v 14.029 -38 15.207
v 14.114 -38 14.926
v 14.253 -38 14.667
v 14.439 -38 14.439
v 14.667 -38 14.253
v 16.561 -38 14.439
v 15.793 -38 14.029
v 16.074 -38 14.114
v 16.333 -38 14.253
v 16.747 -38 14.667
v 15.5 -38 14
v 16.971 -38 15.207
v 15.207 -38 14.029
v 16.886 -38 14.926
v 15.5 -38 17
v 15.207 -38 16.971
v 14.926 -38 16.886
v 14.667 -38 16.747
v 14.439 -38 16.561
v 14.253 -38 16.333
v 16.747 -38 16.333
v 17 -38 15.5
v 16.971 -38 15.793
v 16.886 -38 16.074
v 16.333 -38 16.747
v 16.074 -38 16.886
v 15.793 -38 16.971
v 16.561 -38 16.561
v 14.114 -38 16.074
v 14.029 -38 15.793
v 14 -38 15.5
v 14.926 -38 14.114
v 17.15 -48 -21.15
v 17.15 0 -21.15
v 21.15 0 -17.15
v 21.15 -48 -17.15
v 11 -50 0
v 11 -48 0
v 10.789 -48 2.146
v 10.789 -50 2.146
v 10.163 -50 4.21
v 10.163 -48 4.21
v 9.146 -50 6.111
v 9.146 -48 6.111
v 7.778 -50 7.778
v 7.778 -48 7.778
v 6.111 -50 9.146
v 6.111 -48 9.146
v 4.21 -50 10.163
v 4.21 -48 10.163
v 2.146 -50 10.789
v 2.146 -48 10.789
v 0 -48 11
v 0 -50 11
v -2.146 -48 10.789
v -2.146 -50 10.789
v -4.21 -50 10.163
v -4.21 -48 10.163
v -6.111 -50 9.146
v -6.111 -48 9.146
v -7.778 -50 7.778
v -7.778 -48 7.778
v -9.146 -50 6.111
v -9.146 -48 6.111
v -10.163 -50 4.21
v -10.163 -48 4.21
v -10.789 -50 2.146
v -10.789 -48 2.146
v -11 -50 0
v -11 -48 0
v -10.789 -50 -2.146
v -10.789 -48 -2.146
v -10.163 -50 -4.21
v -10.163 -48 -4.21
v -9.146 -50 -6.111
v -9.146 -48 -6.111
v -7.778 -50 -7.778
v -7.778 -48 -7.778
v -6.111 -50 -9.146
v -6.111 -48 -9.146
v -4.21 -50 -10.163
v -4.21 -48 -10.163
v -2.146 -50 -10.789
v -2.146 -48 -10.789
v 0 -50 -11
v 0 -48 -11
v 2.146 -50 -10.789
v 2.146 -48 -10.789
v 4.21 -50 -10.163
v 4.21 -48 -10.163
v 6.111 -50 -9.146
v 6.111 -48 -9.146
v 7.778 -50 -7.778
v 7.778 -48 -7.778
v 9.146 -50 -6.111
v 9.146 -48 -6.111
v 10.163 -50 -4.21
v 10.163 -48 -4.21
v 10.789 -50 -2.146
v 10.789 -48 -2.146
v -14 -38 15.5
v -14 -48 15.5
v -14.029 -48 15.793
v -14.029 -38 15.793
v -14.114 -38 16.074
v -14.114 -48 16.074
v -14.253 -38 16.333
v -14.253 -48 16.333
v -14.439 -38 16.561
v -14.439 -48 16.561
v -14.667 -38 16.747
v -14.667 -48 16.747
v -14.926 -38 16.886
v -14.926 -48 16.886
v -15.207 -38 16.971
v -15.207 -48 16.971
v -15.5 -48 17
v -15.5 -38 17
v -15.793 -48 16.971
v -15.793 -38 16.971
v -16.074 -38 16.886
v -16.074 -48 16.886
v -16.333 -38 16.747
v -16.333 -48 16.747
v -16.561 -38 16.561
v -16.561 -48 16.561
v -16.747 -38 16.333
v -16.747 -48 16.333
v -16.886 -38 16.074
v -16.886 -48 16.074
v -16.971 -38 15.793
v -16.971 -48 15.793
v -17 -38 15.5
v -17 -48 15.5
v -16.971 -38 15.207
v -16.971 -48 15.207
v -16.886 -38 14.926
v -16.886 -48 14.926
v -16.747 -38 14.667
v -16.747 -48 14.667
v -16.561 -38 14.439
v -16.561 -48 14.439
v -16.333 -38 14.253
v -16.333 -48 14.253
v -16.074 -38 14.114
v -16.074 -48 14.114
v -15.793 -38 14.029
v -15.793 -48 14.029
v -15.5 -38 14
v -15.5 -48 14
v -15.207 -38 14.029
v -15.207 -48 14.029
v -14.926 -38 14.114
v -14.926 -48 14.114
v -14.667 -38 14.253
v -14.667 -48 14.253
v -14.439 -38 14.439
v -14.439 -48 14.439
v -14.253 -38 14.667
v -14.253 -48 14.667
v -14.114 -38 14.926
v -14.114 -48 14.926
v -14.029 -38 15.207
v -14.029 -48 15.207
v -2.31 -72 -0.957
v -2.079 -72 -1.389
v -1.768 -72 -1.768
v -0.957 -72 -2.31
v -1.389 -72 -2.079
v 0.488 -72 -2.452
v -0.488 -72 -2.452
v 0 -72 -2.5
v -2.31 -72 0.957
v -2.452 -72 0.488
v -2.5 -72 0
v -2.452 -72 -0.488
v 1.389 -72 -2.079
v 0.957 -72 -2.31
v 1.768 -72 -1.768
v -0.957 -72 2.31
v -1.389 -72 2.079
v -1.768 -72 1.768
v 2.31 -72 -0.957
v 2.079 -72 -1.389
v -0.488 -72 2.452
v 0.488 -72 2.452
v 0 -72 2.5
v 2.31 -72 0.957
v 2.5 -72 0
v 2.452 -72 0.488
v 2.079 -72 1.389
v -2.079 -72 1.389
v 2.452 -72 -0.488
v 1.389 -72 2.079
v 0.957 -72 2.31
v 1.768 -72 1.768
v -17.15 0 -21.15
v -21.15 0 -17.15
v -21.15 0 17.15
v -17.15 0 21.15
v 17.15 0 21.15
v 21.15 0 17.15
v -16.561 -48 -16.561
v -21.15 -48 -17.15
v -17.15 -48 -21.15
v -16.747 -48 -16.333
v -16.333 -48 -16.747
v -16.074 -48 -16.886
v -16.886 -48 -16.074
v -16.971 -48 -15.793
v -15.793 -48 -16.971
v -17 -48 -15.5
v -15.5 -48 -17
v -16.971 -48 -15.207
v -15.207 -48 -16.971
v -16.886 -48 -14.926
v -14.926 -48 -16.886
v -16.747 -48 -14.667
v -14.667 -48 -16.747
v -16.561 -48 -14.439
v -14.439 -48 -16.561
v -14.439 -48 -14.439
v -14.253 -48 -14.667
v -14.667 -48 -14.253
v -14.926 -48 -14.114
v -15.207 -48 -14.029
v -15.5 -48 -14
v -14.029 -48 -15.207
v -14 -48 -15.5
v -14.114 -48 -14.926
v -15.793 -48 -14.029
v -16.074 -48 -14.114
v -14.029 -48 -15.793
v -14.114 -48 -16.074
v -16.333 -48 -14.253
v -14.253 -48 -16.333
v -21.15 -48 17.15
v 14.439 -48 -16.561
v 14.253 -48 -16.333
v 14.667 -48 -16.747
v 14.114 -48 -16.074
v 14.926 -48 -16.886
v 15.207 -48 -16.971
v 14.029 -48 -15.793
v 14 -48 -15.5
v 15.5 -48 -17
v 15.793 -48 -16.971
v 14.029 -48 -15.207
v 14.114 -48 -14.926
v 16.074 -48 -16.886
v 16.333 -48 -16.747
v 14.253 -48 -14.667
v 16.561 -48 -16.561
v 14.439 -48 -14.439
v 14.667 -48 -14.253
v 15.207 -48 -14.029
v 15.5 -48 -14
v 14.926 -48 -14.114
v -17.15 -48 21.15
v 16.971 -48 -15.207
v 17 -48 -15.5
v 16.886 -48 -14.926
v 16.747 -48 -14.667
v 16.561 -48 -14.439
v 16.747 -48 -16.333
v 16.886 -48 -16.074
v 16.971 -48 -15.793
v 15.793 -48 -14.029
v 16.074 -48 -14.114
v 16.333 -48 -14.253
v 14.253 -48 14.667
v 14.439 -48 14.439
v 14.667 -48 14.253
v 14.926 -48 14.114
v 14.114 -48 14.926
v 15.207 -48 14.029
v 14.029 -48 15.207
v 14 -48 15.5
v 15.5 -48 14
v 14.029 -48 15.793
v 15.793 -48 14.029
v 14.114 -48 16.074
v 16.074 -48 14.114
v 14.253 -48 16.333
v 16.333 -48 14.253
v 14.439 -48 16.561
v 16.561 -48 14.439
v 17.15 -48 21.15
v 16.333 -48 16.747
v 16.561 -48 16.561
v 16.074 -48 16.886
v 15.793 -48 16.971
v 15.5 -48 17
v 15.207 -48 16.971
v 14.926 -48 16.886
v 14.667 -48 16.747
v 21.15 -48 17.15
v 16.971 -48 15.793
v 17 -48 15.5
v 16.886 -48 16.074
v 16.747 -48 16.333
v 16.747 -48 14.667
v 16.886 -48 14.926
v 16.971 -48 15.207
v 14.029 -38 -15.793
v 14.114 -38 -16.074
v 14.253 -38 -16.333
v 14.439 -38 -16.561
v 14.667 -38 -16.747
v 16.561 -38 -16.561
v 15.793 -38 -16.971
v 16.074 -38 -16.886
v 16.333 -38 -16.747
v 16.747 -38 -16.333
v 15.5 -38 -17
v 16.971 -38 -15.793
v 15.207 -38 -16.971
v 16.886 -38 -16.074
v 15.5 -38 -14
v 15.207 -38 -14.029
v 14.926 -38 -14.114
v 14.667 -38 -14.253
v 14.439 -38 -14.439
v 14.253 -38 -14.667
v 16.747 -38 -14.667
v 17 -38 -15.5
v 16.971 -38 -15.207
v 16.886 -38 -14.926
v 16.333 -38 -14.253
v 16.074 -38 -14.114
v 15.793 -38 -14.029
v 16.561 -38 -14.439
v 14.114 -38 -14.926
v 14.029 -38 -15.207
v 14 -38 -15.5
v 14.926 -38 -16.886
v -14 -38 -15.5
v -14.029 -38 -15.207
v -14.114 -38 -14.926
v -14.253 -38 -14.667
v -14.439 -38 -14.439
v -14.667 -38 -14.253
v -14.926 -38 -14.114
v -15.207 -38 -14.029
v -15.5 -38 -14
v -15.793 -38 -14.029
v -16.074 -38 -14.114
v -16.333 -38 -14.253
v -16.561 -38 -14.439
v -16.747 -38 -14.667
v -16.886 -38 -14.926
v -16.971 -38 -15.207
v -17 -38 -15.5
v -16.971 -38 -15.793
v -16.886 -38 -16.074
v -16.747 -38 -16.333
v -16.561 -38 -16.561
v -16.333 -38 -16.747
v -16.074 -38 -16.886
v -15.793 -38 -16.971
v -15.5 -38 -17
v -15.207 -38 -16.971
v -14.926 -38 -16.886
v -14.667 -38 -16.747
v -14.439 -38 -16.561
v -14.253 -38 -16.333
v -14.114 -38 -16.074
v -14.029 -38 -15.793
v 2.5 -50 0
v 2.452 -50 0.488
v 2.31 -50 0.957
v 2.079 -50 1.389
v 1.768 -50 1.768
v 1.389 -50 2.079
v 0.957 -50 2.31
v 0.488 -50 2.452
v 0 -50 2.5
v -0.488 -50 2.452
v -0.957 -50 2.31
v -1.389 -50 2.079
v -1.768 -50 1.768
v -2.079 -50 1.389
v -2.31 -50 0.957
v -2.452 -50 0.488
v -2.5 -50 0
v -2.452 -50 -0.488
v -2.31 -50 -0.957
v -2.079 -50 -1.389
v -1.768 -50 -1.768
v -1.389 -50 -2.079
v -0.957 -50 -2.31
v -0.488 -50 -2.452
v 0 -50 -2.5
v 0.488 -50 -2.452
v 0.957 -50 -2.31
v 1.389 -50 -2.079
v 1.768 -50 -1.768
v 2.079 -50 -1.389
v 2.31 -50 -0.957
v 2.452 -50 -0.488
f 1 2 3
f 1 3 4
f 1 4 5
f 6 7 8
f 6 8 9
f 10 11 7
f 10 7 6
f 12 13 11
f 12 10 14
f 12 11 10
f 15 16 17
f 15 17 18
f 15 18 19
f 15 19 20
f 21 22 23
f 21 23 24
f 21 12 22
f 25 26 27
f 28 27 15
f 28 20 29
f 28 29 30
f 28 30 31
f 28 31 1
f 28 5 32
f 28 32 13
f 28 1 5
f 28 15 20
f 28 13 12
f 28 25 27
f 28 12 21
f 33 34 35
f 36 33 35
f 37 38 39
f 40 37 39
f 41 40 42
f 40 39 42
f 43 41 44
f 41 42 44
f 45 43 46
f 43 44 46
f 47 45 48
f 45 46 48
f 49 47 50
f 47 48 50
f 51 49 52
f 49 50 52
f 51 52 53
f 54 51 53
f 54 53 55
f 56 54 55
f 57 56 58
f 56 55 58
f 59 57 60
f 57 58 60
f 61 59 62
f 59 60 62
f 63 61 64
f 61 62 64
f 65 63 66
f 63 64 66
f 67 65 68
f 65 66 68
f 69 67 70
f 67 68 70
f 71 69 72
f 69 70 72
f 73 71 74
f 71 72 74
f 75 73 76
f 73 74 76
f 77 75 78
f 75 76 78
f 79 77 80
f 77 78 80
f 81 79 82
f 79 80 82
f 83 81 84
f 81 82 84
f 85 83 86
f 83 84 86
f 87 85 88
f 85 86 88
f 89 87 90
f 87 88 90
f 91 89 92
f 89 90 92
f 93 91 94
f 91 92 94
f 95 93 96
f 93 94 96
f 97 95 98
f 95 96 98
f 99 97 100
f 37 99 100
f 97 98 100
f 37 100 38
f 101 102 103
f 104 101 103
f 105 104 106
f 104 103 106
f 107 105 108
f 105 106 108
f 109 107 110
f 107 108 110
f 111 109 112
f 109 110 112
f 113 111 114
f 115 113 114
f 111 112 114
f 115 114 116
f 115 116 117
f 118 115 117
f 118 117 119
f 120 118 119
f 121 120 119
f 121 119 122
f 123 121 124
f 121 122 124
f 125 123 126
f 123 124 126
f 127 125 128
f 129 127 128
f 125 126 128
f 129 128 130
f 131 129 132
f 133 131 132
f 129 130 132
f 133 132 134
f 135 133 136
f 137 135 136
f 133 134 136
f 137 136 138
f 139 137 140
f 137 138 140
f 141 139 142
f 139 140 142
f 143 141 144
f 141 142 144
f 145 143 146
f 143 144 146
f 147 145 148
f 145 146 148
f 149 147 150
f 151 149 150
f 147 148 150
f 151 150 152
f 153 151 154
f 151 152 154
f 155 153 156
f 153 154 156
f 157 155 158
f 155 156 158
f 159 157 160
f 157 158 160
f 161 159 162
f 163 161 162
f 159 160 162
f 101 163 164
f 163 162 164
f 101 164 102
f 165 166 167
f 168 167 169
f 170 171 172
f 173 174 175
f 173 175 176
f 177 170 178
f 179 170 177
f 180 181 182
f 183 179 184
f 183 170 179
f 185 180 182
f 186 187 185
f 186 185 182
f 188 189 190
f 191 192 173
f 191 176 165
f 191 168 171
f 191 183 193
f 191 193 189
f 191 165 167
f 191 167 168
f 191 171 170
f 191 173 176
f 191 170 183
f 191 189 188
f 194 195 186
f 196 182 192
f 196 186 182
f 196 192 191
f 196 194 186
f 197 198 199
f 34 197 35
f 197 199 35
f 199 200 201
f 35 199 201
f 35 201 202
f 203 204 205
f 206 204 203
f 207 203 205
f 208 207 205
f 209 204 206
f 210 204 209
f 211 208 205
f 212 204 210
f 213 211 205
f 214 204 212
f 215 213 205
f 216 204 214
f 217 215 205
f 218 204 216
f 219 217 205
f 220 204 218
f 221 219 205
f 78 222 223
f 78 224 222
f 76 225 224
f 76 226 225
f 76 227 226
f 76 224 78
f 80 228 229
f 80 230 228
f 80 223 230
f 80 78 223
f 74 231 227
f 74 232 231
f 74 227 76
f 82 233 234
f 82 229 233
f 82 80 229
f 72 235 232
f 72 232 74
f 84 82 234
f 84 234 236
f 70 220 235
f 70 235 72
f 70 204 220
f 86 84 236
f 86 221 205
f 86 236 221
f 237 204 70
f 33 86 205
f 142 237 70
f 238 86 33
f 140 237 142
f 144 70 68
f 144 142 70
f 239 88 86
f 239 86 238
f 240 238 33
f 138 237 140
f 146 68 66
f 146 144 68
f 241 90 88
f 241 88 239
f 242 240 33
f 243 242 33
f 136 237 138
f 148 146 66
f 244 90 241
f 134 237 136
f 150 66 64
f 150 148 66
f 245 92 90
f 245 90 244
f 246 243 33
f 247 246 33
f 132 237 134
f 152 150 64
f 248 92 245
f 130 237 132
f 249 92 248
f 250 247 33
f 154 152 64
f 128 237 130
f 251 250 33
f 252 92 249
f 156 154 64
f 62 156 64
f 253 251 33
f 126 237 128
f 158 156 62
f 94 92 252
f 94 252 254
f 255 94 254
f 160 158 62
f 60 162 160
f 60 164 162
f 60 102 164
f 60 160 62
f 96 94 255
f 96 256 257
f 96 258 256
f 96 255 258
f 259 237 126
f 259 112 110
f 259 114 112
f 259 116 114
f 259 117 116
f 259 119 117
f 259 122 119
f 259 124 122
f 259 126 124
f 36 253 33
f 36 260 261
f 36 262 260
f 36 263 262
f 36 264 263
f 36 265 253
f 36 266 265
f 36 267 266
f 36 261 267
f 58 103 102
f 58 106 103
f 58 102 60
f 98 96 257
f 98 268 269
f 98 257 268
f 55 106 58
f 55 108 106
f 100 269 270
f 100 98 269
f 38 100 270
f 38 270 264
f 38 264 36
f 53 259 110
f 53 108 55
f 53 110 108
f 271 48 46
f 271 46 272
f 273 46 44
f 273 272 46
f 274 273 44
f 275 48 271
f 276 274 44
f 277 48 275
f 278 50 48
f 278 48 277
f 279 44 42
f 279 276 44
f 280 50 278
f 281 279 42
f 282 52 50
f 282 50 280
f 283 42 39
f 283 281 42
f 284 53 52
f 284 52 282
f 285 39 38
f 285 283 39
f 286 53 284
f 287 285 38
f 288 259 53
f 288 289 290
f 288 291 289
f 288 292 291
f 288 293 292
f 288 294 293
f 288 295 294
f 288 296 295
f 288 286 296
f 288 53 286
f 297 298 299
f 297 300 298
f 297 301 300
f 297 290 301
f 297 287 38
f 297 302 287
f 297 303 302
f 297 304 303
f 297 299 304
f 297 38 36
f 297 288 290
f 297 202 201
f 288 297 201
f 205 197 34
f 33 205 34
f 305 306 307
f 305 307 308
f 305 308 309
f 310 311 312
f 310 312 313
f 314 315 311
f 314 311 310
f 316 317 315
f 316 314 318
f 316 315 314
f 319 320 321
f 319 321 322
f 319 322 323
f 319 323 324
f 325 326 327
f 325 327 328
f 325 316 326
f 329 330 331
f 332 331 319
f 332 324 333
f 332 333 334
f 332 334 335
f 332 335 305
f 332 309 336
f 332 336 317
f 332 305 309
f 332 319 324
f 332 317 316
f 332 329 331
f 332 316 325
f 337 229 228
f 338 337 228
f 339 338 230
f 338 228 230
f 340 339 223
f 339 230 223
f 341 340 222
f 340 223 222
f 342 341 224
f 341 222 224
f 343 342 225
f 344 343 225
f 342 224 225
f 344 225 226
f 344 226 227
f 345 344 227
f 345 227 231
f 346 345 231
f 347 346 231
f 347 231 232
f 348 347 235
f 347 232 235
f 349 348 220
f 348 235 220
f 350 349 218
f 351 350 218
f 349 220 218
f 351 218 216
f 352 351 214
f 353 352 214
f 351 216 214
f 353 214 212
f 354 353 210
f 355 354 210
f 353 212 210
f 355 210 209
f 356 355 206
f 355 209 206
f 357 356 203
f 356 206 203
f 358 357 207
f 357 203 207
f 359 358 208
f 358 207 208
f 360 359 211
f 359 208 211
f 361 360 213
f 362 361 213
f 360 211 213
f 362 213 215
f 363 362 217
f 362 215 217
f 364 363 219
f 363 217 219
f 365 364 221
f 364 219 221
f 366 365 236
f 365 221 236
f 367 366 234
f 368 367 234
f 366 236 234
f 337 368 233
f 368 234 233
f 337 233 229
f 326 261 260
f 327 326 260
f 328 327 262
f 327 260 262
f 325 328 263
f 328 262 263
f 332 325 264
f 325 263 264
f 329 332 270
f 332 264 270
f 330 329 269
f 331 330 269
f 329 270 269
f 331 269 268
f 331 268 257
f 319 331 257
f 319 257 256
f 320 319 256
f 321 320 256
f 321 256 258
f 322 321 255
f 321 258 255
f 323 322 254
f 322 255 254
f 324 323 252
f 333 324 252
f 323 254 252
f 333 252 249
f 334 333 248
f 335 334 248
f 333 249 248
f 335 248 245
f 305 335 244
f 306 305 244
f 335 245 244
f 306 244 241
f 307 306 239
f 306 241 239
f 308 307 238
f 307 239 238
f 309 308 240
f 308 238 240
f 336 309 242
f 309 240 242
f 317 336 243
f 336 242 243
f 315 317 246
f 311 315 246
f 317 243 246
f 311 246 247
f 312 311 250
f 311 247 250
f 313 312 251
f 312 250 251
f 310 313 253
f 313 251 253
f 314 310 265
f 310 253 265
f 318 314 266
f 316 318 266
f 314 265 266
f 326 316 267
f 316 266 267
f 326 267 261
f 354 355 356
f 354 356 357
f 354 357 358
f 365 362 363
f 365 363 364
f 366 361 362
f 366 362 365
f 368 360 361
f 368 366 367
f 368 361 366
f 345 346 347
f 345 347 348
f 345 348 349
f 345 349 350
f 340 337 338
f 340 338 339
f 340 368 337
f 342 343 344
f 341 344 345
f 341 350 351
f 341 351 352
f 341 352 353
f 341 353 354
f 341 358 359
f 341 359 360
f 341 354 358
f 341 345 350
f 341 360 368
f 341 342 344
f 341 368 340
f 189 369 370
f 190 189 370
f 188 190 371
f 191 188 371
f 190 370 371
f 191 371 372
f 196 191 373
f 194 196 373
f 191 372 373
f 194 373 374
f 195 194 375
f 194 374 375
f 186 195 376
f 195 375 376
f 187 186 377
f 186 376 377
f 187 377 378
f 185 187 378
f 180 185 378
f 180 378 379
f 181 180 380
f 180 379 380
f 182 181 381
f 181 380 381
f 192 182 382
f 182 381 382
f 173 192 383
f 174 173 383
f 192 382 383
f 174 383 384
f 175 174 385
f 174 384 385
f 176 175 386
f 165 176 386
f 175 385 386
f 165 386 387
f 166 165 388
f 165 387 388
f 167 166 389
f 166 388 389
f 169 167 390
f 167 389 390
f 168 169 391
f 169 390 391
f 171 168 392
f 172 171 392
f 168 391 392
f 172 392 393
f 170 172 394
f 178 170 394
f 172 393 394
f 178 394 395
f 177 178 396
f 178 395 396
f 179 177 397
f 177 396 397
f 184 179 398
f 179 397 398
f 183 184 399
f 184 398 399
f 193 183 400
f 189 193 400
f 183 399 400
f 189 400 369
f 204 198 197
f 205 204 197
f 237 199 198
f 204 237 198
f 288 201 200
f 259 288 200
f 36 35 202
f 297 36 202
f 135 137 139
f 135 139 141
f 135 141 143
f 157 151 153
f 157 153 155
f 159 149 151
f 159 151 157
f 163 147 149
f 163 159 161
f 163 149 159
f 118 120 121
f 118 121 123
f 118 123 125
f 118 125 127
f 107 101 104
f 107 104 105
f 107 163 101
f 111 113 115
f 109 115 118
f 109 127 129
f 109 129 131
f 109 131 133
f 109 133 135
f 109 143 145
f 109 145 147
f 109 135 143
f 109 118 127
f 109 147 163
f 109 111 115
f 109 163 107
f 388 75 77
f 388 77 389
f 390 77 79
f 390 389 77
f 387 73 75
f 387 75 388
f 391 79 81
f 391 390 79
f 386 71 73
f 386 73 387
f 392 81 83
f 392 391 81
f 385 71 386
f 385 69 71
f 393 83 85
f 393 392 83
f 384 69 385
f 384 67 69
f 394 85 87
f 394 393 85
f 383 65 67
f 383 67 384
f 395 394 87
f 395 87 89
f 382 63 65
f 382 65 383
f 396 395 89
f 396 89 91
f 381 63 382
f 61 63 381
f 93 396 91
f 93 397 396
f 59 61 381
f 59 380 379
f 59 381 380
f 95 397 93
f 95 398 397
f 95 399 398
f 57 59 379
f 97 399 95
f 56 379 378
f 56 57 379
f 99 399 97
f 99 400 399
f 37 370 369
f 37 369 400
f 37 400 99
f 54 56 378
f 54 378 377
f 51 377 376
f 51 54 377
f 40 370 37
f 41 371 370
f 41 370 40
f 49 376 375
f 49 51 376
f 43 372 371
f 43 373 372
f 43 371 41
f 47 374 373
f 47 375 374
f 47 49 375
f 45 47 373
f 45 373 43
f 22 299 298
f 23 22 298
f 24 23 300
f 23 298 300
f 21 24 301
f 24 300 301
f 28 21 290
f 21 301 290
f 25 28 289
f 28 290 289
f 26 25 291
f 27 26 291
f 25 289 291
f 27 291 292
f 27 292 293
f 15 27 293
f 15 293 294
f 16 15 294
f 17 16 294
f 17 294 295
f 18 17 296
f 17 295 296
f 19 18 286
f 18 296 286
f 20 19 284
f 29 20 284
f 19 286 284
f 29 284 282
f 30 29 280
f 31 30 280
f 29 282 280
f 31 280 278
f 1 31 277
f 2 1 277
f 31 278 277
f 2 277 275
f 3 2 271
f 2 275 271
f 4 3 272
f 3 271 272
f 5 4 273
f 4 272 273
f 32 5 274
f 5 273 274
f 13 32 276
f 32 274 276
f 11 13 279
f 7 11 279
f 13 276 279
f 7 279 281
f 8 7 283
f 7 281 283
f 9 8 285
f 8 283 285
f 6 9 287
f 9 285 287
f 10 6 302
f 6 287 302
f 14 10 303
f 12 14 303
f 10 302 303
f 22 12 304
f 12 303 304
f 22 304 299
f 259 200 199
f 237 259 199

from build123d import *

# Parameters (mm, degrees)
F1_DEPTH = 48
F2_R     = 11
F3_DEPTH = 2
F4_R     = 2.5
F5_DEPTH = 22
F6_R     = 1.5
F7_DEPTH = 10


with BuildPart() as f1:
    # F0 (on Front) → F1 (new body)
    with BuildSketch(Plane.XZ):
        Polygon((17.15, 21.15), (0, 21.15), (-17.15, 21.15), (-21.15, 17.15), (-21.15, 0), (-21.15, -17.15), (-17.15, -21.15), (0, -21.15), (17.15, -21.15), (21.15, -17.15), (21.15, 0), (21.15, 17.15), align=None)
    extrude(amount=F1_DEPTH)

    # F2 (on face) → F3 (join)
    with BuildSketch(Plane.XZ.offset(48)):
        Circle(F2_R)
    extrude(amount=F3_DEPTH)

    # F4 (on face) → F5 (join)
    with BuildSketch(Plane.XZ.offset(50)):
        Circle(F4_R)
    extrude(amount=F5_DEPTH)

    # F6 (on face) → F7 (cut)
    with BuildSketch(Plane.XZ.offset(48)):
        with Locations((-15.5, 15.5)):
            Circle(F6_R)
        with Locations((15.5, 15.5)):
            Circle(F6_R)
        with Locations((-15.5, -15.5)):
            Circle(F6_R)
        with Locations((15.5, -15.5)):
            Circle(F6_R)
    extrude(amount=-F7_DEPTH, mode=Mode.SUBTRACT)


solid = f1.part
